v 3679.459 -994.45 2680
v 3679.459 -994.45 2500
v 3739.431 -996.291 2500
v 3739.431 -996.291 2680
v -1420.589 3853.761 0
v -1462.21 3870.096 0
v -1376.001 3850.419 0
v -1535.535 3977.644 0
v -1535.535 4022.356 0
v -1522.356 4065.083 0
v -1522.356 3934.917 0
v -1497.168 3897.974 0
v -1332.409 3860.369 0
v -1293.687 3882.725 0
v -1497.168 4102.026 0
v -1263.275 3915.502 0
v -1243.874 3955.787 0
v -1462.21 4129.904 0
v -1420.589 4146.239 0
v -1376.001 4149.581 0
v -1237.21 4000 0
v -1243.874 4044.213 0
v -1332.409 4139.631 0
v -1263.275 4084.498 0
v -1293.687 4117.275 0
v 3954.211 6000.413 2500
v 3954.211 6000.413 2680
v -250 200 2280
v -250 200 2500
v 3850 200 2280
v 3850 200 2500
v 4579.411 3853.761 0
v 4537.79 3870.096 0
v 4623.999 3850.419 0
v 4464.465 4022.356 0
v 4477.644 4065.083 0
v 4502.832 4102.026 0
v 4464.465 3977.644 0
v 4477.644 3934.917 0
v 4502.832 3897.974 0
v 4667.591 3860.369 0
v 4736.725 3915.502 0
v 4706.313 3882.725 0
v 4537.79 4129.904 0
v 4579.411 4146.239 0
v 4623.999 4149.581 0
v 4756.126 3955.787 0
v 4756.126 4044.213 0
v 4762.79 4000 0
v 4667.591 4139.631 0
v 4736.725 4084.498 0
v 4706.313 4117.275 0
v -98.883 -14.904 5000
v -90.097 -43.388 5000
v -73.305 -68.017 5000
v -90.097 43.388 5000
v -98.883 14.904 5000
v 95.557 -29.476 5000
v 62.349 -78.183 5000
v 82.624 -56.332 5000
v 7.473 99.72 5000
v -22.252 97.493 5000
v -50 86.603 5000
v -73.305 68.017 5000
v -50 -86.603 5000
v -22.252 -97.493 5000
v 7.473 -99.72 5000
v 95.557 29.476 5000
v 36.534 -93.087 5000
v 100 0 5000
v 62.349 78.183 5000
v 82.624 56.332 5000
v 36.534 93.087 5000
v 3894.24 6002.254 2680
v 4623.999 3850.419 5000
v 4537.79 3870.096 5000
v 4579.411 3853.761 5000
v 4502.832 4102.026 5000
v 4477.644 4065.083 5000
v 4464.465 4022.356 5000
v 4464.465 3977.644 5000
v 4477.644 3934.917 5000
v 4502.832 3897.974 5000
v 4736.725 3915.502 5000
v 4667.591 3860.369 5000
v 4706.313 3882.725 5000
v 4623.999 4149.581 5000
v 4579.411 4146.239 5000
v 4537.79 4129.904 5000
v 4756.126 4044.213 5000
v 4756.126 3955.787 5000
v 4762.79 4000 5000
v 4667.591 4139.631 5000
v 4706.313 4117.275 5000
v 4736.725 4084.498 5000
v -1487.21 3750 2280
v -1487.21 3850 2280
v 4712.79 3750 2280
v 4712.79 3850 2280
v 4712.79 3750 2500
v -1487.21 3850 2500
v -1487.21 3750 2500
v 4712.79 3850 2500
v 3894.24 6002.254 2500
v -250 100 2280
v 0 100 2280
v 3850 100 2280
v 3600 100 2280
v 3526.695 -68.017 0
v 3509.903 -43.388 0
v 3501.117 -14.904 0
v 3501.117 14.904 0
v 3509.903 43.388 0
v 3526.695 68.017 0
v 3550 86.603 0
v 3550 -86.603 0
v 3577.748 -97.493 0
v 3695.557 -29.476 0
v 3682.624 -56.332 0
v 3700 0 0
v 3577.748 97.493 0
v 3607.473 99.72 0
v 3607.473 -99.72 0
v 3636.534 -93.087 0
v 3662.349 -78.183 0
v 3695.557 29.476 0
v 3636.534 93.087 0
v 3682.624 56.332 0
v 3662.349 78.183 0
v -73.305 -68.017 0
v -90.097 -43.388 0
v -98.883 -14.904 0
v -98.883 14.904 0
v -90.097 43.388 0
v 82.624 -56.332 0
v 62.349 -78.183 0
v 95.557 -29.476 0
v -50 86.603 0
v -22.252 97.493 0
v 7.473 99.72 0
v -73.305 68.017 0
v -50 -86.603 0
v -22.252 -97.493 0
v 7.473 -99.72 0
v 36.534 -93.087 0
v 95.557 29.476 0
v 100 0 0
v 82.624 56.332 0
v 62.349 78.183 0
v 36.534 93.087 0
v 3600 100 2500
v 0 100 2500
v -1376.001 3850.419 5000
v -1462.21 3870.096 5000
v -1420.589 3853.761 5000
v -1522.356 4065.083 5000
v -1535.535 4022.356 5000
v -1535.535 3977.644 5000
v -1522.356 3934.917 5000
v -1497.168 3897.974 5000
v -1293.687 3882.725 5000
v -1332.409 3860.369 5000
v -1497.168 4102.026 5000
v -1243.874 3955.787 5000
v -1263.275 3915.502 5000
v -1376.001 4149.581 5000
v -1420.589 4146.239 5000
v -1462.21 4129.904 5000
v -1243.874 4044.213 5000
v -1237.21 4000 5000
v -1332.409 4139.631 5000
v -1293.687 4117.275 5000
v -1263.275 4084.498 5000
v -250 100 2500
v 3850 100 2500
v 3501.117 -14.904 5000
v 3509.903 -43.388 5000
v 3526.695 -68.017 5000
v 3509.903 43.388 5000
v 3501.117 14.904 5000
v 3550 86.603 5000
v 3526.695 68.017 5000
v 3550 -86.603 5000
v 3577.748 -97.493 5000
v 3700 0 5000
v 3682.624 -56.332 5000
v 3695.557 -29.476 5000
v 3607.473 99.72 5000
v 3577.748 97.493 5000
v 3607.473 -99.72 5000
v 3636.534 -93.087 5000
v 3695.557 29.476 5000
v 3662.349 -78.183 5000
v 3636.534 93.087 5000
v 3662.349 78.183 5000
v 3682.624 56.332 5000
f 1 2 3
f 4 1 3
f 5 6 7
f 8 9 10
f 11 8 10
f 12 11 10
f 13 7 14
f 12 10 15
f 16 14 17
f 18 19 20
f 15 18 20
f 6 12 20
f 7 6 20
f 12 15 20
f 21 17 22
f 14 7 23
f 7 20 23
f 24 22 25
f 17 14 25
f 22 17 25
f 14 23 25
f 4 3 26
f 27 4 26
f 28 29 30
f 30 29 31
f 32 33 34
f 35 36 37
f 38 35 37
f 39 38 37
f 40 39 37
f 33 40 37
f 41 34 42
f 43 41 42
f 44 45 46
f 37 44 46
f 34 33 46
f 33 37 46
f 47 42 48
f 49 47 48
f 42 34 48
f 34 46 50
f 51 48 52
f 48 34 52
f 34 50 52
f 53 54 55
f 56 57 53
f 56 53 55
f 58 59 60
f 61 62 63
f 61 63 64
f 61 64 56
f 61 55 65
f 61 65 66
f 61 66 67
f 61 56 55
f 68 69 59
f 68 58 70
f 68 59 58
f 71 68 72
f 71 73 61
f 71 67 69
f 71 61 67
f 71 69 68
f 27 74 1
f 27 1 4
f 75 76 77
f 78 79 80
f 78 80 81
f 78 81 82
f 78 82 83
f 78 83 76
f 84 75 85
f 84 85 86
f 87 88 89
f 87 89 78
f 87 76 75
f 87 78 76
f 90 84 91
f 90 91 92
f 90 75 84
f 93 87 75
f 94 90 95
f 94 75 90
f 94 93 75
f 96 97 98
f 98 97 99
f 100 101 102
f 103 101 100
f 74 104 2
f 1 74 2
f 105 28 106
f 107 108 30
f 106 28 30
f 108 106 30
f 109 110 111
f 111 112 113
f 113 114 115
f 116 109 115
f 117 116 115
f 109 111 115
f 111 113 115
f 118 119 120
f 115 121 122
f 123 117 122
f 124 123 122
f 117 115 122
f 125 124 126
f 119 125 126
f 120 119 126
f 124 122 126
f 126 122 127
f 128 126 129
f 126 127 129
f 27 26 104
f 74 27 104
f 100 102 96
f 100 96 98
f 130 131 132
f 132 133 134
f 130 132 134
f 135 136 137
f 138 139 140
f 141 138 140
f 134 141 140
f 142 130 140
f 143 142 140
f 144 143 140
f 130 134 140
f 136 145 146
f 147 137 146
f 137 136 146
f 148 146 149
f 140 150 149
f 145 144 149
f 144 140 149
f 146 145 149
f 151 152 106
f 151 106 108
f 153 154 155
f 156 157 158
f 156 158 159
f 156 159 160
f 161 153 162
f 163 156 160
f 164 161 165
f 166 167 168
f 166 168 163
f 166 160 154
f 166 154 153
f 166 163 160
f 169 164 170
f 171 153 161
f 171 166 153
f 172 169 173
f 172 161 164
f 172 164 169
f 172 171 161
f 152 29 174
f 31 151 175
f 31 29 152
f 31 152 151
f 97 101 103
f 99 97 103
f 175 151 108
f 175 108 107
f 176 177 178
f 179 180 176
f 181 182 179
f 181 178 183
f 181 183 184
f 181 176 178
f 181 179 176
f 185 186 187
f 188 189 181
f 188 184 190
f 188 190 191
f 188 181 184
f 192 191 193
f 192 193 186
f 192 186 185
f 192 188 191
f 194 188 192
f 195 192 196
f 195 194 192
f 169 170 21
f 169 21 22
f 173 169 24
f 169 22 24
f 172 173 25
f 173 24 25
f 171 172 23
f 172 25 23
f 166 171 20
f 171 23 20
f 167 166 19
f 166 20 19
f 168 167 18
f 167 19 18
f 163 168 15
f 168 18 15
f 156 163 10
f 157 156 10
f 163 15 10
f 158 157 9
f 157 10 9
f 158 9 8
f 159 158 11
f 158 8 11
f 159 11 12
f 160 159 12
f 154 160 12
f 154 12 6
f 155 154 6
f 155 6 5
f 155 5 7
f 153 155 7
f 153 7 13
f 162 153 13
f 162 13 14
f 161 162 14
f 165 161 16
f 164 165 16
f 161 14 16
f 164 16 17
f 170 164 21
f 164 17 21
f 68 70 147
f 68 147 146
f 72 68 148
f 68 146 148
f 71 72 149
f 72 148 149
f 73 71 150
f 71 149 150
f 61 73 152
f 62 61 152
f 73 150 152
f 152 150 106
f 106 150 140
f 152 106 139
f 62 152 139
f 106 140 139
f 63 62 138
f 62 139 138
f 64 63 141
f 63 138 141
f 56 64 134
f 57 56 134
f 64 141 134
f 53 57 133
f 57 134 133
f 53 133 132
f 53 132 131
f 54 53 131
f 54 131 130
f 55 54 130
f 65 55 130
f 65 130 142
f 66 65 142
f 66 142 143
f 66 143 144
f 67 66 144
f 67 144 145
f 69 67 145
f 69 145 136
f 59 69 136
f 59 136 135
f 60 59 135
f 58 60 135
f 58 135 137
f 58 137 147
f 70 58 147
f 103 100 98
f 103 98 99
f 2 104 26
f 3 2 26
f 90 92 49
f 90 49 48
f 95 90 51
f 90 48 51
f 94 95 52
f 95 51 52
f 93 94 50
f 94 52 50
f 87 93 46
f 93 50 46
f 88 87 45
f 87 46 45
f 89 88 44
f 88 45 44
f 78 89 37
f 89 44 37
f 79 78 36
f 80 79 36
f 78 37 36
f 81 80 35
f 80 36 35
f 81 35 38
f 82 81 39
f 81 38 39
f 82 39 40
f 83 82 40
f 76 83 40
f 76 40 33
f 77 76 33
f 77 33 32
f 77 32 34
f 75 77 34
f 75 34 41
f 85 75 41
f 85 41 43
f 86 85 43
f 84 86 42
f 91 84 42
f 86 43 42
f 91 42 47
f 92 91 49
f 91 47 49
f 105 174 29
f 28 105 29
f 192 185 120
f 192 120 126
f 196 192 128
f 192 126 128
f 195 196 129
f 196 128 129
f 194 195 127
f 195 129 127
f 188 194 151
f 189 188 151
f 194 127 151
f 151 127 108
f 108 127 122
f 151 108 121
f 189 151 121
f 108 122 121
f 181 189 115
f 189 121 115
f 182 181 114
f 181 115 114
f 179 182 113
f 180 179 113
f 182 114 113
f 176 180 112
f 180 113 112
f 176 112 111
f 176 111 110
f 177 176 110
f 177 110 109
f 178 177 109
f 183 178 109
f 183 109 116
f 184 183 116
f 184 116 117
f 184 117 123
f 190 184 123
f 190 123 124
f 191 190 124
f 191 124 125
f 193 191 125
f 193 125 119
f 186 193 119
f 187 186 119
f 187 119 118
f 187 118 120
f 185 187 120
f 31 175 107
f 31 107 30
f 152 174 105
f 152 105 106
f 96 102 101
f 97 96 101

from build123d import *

# Parameters (mm, degrees)
F0_R     = 100
F1_DEPTH = 5000
F0_R_2   = 150
F4_W     = 4100
F4_H     = 100
F5_DEPTH = 220
F6_W     = 6200
F6_H     = 100
F7_DEPTH = 220
F9_DEPTH = 180


with BuildPart() as f1:
    # F0 (on Top) → F1 (new body)
    with BuildSketch(Plane.XY):
        Circle(F0_R)
    extrude(amount=F1_DEPTH)



with BuildPart() as f1b:
    # F0 (on Top) → F1, piece 2 (new body)
    with BuildSketch(Plane.XY):
        with Locations((-1387.2103691101, 4000)):
            Circle(F0_R_2)
    extrude(amount=F1_DEPTH)


with BuildPart() as f1c:
    # F0 (on Top) → F1, piece 3 (new body)
    with BuildSketch(Plane.XY):
        with Locations((4612.7896308899, 4000)):
            Circle(F0_R_2)
    extrude(amount=F1_DEPTH)


with BuildPart() as f1d:
    # F0 (on Top) → F1, piece 4 (new body)
    with BuildSketch(Plane.XY):
        with Locations((3600, 0)):
            Circle(F0_R)
    extrude(amount=F1_DEPTH)


with BuildPart() as f1_1:
    add(f1.part)

    add(f1d.part)  # F5 merges F1d
    # F4 (on mid) → F5 (join)
    with BuildSketch(Plane.XY.offset(2500)):
        with Locations((1800, 150)):
            Rectangle(F4_W, F4_H)
    extrude(amount=-F5_DEPTH)


with BuildPart() as f7:
    # F6 (on mid) → F7 (new body, through all)
    with BuildSketch(Plane.XY.offset(2500)):
        with Locations((1612.7896308899, 3800)):
            Rectangle(F6_W, F6_H)
    extrude(amount=-F7_DEPTH)


with BuildPart() as f9:
    # F8 (on mid) → F9 (new body)
    with BuildSketch(Plane.XY.offset(2500)):
        Polygon((3894.239503031, 6002.2538818607), (3679.4588223743, -994.4502893342), (3739.4305724132, -996.291266597), (3954.2112530699, 6000.4129045979), align=None)
    extrude(amount=F9_DEPTH)


solid = Compound([f1b.part, f1c.part, f1_1.part, f7.part, f9.part])
